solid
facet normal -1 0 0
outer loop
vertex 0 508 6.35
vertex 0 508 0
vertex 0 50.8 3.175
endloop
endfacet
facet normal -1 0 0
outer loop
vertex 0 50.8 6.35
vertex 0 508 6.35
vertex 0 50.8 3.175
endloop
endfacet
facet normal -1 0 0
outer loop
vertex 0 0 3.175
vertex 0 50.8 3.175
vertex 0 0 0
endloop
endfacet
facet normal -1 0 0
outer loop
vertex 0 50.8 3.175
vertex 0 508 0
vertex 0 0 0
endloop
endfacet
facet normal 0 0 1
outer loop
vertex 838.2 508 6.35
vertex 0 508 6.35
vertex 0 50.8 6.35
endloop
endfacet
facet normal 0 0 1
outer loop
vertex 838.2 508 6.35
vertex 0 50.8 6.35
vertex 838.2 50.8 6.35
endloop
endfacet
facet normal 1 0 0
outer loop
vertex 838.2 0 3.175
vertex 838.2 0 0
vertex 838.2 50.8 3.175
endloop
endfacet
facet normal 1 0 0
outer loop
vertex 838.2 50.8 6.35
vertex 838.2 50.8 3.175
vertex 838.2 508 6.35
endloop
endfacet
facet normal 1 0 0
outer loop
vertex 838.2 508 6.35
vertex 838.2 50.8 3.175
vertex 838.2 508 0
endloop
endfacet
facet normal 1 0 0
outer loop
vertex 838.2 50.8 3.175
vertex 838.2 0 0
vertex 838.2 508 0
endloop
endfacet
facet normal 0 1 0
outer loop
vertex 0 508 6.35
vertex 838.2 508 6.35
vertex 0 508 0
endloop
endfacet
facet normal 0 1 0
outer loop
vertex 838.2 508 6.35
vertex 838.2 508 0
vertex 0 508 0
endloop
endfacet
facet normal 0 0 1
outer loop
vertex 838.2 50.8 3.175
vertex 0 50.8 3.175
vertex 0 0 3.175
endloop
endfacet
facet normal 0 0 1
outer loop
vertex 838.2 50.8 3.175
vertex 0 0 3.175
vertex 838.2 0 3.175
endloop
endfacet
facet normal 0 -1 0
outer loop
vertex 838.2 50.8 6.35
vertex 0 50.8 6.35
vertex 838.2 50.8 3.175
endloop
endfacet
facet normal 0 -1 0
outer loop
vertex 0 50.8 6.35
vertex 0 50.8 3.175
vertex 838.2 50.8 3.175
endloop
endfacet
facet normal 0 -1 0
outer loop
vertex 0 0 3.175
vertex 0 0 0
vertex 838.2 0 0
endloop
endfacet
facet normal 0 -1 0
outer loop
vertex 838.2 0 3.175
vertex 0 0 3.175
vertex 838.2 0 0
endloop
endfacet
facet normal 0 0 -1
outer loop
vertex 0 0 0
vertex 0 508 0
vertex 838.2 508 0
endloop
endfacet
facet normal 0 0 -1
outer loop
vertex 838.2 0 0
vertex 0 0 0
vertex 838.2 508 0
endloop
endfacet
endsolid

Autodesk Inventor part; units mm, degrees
ref_plane "YZ Plane" through (0, 0, 0) normal (1, 0, 0) x (0, 1, 0)
ref_plane "XZ Plane" through (0, 0, 0) normal (0, 1, 0) x (-1, 0, 0)
ref_plane "XY Plane" through (0, 0, 0) normal (0, 0, 1) x (1, 0, 0)
sketch "Sketch1" plane through (0, 0, 0) normal (0, 0, 1) x (1, 0, 0)
  line L0 (0, 0) -> (838.2, 0)
  line L1 (838.2, 0) -> (838.2, 508)
  line L2 (838.2, 508) -> (0, 508)
  line L3 (0, 508) -> (0, 0)
  line L4 (0, 50.8) -> (838.2, 50.8)
  dimension "d0" = 508
  dimension "d1" = 838.2
  dimension "d2" = 50.8
extrude "Extrusion1" add sketch "Sketch1" along normal blind 6.35 contours L3 L2 L1 L4
extrude "Extrusion2" add sketch "Sketch1" along normal blind 3.175 contours L3 L4 L1 L0
properties part number "manipulator top"
